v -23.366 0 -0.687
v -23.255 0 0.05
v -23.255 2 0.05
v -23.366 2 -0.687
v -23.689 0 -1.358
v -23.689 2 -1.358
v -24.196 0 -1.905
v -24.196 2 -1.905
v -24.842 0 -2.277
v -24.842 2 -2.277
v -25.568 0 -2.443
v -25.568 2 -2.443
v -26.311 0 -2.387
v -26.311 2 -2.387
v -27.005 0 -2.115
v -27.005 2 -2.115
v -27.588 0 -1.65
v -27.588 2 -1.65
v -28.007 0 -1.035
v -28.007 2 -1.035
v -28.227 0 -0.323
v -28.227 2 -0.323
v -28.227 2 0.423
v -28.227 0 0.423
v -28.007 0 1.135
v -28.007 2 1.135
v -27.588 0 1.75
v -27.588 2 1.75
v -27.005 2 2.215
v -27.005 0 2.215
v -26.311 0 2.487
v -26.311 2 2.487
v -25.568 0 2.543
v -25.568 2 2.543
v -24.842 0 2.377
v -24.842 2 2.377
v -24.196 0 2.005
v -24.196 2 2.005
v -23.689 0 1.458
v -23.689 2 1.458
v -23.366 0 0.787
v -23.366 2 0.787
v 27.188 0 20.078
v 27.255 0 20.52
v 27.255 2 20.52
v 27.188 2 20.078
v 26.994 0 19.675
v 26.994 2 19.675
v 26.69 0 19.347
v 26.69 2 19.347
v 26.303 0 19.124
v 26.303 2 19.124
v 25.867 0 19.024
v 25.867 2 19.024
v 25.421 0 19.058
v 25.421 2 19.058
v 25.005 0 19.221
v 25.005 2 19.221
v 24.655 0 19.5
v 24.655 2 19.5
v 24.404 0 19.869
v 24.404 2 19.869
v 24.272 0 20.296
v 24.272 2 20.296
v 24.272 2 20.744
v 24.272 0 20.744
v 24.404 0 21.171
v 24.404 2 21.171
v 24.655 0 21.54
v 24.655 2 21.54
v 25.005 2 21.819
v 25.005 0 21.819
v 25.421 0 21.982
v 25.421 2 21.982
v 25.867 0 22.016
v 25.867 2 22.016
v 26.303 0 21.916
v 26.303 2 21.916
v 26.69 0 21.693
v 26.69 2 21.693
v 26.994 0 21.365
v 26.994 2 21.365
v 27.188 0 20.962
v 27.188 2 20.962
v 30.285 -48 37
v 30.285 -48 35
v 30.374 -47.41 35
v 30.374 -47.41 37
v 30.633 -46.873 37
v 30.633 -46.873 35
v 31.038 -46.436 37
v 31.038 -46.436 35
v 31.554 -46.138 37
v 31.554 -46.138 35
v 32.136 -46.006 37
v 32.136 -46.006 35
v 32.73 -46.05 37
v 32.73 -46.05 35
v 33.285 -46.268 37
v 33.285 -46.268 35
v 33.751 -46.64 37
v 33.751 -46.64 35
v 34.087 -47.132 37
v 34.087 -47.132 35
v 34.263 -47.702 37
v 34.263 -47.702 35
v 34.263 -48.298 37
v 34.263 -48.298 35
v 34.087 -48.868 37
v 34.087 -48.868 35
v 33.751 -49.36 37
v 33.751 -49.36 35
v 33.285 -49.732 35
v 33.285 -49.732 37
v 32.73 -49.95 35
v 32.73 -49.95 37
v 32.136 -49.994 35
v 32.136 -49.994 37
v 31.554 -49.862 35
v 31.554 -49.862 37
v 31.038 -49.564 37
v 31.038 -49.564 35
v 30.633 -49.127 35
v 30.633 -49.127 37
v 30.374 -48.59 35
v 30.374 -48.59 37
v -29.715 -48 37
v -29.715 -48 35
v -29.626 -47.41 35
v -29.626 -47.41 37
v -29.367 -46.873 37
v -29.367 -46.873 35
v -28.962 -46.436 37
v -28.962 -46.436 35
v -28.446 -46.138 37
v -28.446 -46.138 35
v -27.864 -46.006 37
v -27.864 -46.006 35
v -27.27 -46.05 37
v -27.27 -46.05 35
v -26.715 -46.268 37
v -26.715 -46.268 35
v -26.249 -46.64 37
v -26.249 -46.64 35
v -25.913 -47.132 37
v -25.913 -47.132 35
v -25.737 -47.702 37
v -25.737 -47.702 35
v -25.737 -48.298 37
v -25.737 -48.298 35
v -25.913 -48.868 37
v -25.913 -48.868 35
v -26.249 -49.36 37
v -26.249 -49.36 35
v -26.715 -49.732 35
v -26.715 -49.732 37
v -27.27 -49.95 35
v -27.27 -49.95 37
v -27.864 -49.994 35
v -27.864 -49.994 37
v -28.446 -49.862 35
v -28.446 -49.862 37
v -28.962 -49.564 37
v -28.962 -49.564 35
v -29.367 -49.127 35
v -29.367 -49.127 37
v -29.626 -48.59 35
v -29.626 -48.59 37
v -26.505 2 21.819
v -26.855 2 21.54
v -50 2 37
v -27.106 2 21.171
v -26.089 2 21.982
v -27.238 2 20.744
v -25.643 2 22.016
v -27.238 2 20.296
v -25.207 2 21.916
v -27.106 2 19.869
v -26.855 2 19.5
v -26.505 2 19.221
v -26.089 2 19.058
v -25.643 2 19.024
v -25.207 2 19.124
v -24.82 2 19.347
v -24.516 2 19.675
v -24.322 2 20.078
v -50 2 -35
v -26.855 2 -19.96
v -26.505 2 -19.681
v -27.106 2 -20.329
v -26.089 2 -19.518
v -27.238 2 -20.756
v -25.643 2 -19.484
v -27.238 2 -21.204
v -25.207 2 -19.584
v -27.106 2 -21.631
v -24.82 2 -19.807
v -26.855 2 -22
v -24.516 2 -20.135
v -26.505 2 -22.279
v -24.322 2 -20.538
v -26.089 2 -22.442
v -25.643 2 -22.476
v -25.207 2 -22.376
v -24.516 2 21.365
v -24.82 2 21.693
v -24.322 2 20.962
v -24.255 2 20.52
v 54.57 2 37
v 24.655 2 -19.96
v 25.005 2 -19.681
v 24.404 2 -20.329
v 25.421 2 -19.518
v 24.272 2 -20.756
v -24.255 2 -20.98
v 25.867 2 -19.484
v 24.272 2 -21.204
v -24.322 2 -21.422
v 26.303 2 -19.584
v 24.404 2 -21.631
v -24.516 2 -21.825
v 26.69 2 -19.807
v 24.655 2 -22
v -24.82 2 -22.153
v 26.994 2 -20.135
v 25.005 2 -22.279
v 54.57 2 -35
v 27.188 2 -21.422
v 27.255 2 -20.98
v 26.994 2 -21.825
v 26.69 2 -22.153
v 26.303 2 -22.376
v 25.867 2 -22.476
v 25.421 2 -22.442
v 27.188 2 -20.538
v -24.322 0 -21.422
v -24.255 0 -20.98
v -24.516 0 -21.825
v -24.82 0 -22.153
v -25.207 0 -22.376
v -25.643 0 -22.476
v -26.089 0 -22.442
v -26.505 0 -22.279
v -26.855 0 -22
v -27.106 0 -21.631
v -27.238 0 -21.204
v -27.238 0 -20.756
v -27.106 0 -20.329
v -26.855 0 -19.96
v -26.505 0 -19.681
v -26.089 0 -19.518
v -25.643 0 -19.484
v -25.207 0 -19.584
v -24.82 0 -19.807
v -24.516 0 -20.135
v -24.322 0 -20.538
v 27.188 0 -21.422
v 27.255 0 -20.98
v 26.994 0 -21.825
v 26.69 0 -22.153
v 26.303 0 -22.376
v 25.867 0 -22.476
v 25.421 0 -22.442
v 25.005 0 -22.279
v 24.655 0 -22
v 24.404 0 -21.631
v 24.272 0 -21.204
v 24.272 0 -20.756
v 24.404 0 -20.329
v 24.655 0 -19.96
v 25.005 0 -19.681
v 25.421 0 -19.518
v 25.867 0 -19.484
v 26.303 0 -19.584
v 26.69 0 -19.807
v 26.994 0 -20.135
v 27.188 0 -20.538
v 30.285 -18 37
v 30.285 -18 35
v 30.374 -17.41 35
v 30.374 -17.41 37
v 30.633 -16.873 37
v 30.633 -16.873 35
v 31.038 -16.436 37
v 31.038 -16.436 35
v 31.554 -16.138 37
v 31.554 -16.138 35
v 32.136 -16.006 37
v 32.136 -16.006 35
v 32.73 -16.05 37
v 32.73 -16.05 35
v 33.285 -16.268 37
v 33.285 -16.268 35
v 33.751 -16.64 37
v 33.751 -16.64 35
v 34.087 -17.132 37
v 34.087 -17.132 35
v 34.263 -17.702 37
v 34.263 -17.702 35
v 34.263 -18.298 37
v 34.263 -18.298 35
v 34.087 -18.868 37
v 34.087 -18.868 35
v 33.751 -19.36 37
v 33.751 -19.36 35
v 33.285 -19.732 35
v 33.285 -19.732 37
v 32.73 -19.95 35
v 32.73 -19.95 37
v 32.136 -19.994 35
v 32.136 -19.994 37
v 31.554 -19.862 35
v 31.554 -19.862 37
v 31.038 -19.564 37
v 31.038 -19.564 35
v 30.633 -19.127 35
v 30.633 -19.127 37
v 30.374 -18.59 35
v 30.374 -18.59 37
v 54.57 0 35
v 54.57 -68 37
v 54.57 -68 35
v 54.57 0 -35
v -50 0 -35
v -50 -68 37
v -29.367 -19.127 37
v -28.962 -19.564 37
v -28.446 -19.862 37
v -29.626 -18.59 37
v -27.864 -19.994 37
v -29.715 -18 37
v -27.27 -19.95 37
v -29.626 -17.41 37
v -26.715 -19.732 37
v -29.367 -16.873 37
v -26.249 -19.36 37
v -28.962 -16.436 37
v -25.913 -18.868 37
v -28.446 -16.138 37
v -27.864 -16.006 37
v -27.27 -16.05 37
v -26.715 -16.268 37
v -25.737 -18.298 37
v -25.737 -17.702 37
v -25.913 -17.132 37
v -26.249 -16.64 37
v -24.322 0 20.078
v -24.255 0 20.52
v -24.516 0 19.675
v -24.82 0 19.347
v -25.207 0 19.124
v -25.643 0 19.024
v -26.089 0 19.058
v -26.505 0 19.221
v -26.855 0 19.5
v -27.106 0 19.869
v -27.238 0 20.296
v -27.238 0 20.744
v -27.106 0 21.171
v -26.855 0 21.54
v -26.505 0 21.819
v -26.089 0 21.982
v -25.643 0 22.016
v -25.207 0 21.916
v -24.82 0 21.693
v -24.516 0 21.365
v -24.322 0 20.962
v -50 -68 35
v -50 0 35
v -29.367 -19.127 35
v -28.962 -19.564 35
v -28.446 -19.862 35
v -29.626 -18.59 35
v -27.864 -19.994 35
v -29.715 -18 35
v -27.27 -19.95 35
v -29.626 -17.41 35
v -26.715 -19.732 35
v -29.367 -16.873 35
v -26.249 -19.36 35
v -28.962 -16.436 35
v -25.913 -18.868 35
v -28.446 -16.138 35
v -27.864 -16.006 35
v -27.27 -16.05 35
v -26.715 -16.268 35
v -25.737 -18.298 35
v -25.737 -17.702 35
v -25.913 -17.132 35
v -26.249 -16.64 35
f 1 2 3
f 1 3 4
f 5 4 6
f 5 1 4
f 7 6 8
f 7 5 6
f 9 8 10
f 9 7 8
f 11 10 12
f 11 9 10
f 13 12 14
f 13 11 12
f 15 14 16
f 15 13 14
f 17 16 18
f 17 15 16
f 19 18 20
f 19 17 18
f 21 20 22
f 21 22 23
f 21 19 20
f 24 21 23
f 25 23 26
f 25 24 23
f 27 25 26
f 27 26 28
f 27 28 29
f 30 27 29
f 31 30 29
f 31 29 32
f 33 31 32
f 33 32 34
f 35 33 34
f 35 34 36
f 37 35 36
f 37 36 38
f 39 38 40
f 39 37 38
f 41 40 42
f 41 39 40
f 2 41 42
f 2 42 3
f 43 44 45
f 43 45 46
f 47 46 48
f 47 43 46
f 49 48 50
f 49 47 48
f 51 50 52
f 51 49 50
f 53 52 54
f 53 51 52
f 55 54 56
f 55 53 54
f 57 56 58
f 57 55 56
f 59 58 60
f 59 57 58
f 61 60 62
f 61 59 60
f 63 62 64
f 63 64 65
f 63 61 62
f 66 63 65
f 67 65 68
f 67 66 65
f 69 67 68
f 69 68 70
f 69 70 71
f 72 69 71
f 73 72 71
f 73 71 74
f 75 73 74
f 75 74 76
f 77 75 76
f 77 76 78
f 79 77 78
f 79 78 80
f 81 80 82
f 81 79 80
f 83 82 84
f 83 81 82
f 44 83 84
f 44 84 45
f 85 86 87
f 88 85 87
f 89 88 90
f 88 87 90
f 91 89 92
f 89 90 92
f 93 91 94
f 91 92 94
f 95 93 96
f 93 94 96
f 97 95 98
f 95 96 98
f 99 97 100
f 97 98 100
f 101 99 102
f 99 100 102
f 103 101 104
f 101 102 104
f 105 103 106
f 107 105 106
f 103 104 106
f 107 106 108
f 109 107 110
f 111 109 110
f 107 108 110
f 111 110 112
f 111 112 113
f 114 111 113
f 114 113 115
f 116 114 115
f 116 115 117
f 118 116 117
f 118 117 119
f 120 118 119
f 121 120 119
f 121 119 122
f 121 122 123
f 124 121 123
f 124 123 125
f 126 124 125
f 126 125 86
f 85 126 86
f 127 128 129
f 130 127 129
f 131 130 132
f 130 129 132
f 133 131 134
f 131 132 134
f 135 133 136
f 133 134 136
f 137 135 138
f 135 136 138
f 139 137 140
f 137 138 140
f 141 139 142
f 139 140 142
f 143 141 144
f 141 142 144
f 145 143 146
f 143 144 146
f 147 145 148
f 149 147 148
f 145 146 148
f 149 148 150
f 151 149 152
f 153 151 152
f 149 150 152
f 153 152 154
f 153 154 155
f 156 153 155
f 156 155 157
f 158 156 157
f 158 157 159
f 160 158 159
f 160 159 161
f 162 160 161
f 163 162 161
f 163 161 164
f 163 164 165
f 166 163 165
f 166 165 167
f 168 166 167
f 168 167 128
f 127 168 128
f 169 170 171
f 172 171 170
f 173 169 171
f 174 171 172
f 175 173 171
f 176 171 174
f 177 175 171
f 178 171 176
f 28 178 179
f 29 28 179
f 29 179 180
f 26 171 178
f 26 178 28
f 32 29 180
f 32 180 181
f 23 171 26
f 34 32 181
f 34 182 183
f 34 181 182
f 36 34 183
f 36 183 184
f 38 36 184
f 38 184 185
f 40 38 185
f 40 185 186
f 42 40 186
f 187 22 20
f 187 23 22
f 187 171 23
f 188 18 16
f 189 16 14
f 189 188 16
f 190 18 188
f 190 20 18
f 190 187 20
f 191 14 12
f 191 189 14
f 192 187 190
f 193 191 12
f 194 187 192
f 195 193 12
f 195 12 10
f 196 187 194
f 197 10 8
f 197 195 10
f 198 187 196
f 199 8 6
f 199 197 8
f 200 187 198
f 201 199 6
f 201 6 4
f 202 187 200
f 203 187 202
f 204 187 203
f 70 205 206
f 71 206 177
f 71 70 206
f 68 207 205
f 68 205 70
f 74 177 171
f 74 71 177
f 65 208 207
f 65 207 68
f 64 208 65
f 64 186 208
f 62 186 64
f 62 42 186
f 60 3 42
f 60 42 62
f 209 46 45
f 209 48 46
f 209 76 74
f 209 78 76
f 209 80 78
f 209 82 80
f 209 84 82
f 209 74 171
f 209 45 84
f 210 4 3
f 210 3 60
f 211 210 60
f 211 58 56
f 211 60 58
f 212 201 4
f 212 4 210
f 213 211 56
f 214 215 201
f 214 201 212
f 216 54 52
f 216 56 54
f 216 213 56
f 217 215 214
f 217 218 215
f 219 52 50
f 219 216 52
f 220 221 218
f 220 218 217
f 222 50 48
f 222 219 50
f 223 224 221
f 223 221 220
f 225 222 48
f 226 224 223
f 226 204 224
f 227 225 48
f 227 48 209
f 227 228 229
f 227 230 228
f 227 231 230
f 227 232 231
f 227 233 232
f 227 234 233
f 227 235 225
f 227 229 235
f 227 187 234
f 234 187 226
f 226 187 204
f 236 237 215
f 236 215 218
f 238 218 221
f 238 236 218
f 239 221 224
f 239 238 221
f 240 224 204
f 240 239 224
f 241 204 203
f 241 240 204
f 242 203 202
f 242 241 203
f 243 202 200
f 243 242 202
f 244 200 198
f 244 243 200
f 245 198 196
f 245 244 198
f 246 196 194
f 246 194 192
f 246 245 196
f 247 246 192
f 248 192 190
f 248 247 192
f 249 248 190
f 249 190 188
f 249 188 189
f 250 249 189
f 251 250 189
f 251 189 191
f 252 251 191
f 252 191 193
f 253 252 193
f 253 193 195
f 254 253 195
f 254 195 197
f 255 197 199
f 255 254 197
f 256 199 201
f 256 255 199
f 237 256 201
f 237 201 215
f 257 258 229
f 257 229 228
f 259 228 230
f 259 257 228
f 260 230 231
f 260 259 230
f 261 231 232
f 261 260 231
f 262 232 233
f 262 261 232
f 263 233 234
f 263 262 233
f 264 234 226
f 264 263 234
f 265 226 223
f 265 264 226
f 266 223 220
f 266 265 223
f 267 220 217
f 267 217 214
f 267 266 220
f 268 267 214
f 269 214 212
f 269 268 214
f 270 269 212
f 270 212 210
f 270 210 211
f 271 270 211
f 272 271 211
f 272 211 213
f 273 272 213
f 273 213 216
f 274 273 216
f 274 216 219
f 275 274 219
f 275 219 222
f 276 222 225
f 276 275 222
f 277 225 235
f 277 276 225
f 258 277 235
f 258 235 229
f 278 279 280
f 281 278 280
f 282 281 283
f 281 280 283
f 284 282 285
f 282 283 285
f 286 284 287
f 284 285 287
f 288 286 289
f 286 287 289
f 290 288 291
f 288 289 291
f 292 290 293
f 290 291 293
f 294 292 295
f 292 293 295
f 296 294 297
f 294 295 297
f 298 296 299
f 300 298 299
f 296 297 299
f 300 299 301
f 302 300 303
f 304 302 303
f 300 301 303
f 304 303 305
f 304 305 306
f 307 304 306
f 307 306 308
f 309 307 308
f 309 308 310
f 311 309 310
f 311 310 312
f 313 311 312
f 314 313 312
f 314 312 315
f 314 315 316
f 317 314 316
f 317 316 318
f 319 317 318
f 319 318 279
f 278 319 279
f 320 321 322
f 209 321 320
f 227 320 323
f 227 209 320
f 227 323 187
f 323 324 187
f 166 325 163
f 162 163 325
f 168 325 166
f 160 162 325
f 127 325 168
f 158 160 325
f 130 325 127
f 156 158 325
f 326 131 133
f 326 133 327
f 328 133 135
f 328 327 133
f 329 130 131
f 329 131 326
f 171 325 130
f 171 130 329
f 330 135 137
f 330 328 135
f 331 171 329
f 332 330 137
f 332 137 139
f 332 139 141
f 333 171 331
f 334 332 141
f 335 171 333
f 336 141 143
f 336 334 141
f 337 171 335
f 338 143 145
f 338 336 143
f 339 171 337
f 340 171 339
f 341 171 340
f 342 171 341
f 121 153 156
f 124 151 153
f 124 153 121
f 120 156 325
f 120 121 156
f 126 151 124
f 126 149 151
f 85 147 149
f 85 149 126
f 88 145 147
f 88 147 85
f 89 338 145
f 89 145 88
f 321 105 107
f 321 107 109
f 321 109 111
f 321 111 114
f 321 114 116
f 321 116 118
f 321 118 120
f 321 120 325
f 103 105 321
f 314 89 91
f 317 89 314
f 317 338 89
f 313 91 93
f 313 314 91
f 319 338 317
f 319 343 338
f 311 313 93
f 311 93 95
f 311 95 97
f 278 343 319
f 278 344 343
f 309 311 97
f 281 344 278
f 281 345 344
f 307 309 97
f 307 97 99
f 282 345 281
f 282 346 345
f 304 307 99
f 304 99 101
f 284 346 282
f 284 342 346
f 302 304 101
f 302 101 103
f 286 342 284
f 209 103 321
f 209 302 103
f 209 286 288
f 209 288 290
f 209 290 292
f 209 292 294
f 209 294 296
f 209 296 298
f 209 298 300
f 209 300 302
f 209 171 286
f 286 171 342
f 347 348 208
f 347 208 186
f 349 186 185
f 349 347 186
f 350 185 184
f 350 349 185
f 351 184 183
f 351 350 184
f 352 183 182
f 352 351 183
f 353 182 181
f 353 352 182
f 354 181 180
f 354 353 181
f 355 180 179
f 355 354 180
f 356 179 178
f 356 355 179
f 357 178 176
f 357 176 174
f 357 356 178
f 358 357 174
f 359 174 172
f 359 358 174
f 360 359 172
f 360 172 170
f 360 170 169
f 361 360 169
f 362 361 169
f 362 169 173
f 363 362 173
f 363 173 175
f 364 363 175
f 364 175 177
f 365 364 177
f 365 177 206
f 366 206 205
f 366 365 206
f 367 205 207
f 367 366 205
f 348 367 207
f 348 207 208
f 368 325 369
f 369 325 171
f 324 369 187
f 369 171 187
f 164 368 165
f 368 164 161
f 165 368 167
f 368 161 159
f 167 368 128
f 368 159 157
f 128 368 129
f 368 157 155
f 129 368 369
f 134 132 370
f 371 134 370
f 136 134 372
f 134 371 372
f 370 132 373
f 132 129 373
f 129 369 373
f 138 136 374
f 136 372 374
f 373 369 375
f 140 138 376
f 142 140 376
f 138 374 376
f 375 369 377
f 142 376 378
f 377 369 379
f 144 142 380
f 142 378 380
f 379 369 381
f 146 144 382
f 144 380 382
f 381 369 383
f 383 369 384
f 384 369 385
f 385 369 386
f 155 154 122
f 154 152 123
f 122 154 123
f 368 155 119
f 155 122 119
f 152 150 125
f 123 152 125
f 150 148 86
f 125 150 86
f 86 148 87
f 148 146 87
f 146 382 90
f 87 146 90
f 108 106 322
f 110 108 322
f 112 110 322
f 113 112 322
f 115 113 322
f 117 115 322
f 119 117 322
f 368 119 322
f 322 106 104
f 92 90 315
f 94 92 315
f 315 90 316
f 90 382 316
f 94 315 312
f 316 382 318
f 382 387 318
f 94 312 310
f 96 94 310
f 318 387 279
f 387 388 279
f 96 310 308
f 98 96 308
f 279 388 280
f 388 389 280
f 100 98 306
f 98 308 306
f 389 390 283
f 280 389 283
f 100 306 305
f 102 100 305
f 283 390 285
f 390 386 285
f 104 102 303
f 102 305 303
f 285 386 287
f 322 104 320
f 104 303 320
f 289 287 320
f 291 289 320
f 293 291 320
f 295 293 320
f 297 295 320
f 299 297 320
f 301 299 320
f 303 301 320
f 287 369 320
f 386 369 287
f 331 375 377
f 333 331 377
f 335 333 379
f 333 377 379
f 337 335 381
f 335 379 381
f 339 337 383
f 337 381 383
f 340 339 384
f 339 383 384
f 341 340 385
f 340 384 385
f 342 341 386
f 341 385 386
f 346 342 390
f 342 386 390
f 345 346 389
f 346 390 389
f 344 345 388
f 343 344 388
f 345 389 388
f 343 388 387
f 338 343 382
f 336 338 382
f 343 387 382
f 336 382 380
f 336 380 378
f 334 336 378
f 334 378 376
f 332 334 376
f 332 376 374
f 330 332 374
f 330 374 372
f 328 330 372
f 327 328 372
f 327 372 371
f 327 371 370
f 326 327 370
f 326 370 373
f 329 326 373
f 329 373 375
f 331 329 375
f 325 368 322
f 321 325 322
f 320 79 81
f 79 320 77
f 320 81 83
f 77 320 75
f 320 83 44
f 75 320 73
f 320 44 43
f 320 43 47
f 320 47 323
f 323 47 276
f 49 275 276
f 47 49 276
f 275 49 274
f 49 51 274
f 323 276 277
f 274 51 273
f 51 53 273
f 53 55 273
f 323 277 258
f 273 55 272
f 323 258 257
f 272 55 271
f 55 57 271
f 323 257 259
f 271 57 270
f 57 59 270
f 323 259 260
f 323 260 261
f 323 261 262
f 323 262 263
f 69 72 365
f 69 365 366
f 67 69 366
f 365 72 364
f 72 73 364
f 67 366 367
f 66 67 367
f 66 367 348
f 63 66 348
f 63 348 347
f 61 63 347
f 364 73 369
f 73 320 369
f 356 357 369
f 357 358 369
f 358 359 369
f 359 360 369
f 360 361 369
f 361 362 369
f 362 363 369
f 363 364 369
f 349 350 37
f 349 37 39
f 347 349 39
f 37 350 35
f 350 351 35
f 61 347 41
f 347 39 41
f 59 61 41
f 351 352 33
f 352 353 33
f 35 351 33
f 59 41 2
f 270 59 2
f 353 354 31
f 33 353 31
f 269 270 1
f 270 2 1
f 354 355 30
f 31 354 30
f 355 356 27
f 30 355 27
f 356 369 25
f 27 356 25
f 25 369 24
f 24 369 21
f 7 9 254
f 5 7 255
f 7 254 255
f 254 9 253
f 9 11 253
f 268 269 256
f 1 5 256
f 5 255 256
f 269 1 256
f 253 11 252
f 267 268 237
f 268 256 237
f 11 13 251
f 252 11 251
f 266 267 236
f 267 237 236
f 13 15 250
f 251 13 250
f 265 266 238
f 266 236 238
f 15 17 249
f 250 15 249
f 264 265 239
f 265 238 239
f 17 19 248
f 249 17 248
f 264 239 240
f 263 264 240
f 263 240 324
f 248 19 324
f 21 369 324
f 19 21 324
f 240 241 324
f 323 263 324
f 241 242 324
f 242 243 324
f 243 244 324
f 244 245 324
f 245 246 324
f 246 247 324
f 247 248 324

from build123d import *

# Parameters (mm, degrees)
SKETCH1_W           = 100
SKETCH1_H           = 70
SKETCH1_R           = 1.5
SKETCH1_R_2         = 2.5
BOSS_EXTRUDE1_DEPTH = 2
SKETCH2_W           = 70
SKETCH2_H           = 2
BOSS_EXTRUDE2_DEPTH = 70
SKETCH3_W           = 70
SKETCH3_H           = 2
BOSS_EXTRUDE3_DEPTH = 4.57
SKETCH4_W           = 34.57
SKETCH4_H           = 2
BOSS_EXTRUDE4_DEPTH = 70
SKETCH5_R           = 2
CUT_EXTRUDE1_DEPTH  = 10


with BuildPart() as part:
    # Sketch1 → Boss-Extrude1 (new body)
    with BuildSketch(Plane(origin=(0, 0, 0), x_dir=(1, 0, 0), z_dir=(0, 1, 0))):
        Rectangle(SKETCH1_W, SKETCH1_H)
        with Locations((25.755, 20.98)):
            Circle(SKETCH1_R, mode=Mode.SUBTRACT)
        with Locations((-25.755, 20.98)):
            Circle(SKETCH1_R, mode=Mode.SUBTRACT)
        with Locations((25.755, -20.52)):
            Circle(SKETCH1_R, mode=Mode.SUBTRACT)
        with Locations((-25.755, -20.52)):
            Circle(SKETCH1_R, mode=Mode.SUBTRACT)
        with Locations((-25.755, -0.05)):
            Circle(SKETCH1_R_2, mode=Mode.SUBTRACT)
    extrude(amount=BOSS_EXTRUDE1_DEPTH)

    # Sketch2 → Boss-Extrude2 (add)
    with BuildSketch(Plane(origin=(0, 2, 0), x_dir=(1, 0, 0), z_dir=(0, 1, 0))):
        with Locations((-15, -36)):
            Rectangle(SKETCH2_W, SKETCH2_H)
    extrude(amount=-BOSS_EXTRUDE2_DEPTH)

    # Sketch3 → Boss-Extrude3 (add)
    with BuildSketch(Plane(origin=(50, 0, 0), x_dir=(0, 0, -1), z_dir=(1, 0, 0))):
        with Locations((0, 1)):
            Rectangle(SKETCH3_W, SKETCH3_H)
    extrude(amount=BOSS_EXTRUDE3_DEPTH)

    # Sketch4 → Boss-Extrude4 (add)
    with BuildSketch(Plane(origin=(0, 2, 0), x_dir=(1, 0, 0), z_dir=(0, 1, 0))):
        with Locations((37.285, -36)):
            Rectangle(SKETCH4_W, SKETCH4_H)
    extrude(amount=-BOSS_EXTRUDE4_DEPTH)

    # Sketch5 → Cut-Extrude1 (cut)
    with BuildSketch(Plane(origin=(0, 0, 35), x_dir=(-1, 0, 0), z_dir=(0, 0, -1))):
        with Locations((-32.285, -18)):
            Circle(SKETCH5_R)
        with Locations((27.715, -48)):
            Circle(SKETCH5_R)
        with Locations((-32.285, -48)):
            Circle(SKETCH5_R)
        with Locations((27.715, -18)):
            Circle(SKETCH5_R)
    extrude(amount=-CUT_EXTRUDE1_DEPTH, mode=Mode.SUBTRACT)


solid = part.part
